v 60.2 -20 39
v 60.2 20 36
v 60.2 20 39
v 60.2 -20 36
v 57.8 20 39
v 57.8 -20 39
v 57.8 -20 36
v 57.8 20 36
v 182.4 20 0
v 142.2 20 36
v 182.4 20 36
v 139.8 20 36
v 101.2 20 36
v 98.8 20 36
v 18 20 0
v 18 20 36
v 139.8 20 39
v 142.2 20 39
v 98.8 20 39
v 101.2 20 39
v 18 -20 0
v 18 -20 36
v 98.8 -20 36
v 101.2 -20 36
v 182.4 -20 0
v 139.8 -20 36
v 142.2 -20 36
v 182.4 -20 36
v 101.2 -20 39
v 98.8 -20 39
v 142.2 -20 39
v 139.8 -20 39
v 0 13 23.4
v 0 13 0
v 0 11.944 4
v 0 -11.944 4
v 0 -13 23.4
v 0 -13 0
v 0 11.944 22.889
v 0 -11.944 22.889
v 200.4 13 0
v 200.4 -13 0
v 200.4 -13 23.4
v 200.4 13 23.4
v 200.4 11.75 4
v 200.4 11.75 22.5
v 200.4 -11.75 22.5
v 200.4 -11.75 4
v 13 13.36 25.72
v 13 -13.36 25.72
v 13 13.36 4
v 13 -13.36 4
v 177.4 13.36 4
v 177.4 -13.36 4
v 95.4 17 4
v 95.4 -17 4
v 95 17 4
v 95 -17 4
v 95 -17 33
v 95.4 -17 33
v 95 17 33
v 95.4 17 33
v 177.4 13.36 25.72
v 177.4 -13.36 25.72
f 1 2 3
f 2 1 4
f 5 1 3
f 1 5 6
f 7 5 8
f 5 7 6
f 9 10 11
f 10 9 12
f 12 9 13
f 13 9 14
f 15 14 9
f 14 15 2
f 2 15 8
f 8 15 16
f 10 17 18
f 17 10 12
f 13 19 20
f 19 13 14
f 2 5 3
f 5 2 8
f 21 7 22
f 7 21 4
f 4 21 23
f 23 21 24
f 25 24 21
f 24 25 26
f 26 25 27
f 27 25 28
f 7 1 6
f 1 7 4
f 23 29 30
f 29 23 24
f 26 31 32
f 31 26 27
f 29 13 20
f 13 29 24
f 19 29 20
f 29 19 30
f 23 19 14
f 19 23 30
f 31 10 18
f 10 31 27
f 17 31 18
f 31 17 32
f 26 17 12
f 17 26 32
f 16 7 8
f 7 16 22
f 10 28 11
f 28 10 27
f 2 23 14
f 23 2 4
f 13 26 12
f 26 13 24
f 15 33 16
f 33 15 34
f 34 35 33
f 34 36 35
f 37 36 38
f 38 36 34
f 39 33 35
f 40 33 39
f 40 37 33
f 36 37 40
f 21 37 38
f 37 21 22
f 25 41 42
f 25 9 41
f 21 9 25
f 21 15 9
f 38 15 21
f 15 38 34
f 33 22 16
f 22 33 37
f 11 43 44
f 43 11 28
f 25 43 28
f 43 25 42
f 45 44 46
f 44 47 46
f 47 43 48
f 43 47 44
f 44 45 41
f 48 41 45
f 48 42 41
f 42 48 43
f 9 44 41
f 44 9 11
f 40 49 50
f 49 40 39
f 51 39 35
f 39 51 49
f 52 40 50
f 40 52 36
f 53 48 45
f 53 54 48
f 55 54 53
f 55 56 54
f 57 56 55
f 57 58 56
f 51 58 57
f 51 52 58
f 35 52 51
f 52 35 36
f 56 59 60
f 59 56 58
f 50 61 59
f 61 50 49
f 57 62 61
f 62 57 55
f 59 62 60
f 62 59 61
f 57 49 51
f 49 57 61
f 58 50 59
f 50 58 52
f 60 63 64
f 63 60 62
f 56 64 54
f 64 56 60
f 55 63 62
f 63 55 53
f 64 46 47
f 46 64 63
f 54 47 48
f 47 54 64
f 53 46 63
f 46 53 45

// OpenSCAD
$fn = 32;

// ----------------------------------------------------------------------
// Faired channel: 200 x 40 x 36 mm, 3 mm walls, faired ends
// ----------------------------------------------------------------------

// --- parameters (mm) ---
length = 200;             // channel length
width = 40;               // channel width at mid length
height = 36;              // channel height at mid length
wall = 3;                 // side wall thickness
floor_t = 4;              // floor thickness
end_w = 26;               // faired end width
end_h = 23.4;             // faired end height
ribs = 3;                 // stiffening ribs on the top
rib_t = 2.4;              // rib thickness
rib_h = 3;                // rib height

difference() {
  union() {
    hull() {
      translate([0, -13, 0]) cube([0.4, 26, 23.4]);
      translate([18, -20, 0]) cube([0.4, 40, 36]);
    }
    hull() {
      translate([18, -20, 0]) cube([0.4, 40, 36]);
      translate([100, -20, 0]) cube([0.4, 40, 36]);
    }
    hull() {
      translate([100, -20, 0]) cube([0.4, 40, 36]);
      translate([182, -20, 0]) cube([0.4, 40, 36]);
    }
    hull() {
      translate([182, -20, 0]) cube([0.4, 40, 36]);
      translate([200, -13, 0]) cube([0.4, 26, 23.4]);
    }
    /* stiffening ribs across the flat top, sunk 0.8 mm into it */
    for (i = [1 : ribs]) {
      translate([18 + i * (length - 2 * 18) / (ribs + 1) - rib_t / 2, -width / 2, height - 0.8]) cube([rib_t, width, rib_h + 0.8]);
    }
  }
  /* cavity, 5 mm proud of both ends so the ports are cut clean */
  hull() {
    translate([-5, -11.4, 4]) cube([0.4, 22.8, 17.8]);
    translate([13, -13.36, 4]) cube([0.4, 26.72, 21.72]);
  }
  hull() {
    translate([13, -13.36, 4]) cube([0.4, 26.72, 21.72]);
    translate([95, -17, 4]) cube([0.4, 34, 29]);
  }
  hull() {
    translate([95, -17, 4]) cube([0.4, 34, 29]);
    translate([177, -13.36, 4]) cube([0.4, 26.72, 21.72]);
  }
  hull() {
    translate([177, -13.36, 4]) cube([0.4, 26.72, 21.72]);
    translate([205, -11.4, 4]) cube([0.4, 22.8, 17.8]);
  }
}
